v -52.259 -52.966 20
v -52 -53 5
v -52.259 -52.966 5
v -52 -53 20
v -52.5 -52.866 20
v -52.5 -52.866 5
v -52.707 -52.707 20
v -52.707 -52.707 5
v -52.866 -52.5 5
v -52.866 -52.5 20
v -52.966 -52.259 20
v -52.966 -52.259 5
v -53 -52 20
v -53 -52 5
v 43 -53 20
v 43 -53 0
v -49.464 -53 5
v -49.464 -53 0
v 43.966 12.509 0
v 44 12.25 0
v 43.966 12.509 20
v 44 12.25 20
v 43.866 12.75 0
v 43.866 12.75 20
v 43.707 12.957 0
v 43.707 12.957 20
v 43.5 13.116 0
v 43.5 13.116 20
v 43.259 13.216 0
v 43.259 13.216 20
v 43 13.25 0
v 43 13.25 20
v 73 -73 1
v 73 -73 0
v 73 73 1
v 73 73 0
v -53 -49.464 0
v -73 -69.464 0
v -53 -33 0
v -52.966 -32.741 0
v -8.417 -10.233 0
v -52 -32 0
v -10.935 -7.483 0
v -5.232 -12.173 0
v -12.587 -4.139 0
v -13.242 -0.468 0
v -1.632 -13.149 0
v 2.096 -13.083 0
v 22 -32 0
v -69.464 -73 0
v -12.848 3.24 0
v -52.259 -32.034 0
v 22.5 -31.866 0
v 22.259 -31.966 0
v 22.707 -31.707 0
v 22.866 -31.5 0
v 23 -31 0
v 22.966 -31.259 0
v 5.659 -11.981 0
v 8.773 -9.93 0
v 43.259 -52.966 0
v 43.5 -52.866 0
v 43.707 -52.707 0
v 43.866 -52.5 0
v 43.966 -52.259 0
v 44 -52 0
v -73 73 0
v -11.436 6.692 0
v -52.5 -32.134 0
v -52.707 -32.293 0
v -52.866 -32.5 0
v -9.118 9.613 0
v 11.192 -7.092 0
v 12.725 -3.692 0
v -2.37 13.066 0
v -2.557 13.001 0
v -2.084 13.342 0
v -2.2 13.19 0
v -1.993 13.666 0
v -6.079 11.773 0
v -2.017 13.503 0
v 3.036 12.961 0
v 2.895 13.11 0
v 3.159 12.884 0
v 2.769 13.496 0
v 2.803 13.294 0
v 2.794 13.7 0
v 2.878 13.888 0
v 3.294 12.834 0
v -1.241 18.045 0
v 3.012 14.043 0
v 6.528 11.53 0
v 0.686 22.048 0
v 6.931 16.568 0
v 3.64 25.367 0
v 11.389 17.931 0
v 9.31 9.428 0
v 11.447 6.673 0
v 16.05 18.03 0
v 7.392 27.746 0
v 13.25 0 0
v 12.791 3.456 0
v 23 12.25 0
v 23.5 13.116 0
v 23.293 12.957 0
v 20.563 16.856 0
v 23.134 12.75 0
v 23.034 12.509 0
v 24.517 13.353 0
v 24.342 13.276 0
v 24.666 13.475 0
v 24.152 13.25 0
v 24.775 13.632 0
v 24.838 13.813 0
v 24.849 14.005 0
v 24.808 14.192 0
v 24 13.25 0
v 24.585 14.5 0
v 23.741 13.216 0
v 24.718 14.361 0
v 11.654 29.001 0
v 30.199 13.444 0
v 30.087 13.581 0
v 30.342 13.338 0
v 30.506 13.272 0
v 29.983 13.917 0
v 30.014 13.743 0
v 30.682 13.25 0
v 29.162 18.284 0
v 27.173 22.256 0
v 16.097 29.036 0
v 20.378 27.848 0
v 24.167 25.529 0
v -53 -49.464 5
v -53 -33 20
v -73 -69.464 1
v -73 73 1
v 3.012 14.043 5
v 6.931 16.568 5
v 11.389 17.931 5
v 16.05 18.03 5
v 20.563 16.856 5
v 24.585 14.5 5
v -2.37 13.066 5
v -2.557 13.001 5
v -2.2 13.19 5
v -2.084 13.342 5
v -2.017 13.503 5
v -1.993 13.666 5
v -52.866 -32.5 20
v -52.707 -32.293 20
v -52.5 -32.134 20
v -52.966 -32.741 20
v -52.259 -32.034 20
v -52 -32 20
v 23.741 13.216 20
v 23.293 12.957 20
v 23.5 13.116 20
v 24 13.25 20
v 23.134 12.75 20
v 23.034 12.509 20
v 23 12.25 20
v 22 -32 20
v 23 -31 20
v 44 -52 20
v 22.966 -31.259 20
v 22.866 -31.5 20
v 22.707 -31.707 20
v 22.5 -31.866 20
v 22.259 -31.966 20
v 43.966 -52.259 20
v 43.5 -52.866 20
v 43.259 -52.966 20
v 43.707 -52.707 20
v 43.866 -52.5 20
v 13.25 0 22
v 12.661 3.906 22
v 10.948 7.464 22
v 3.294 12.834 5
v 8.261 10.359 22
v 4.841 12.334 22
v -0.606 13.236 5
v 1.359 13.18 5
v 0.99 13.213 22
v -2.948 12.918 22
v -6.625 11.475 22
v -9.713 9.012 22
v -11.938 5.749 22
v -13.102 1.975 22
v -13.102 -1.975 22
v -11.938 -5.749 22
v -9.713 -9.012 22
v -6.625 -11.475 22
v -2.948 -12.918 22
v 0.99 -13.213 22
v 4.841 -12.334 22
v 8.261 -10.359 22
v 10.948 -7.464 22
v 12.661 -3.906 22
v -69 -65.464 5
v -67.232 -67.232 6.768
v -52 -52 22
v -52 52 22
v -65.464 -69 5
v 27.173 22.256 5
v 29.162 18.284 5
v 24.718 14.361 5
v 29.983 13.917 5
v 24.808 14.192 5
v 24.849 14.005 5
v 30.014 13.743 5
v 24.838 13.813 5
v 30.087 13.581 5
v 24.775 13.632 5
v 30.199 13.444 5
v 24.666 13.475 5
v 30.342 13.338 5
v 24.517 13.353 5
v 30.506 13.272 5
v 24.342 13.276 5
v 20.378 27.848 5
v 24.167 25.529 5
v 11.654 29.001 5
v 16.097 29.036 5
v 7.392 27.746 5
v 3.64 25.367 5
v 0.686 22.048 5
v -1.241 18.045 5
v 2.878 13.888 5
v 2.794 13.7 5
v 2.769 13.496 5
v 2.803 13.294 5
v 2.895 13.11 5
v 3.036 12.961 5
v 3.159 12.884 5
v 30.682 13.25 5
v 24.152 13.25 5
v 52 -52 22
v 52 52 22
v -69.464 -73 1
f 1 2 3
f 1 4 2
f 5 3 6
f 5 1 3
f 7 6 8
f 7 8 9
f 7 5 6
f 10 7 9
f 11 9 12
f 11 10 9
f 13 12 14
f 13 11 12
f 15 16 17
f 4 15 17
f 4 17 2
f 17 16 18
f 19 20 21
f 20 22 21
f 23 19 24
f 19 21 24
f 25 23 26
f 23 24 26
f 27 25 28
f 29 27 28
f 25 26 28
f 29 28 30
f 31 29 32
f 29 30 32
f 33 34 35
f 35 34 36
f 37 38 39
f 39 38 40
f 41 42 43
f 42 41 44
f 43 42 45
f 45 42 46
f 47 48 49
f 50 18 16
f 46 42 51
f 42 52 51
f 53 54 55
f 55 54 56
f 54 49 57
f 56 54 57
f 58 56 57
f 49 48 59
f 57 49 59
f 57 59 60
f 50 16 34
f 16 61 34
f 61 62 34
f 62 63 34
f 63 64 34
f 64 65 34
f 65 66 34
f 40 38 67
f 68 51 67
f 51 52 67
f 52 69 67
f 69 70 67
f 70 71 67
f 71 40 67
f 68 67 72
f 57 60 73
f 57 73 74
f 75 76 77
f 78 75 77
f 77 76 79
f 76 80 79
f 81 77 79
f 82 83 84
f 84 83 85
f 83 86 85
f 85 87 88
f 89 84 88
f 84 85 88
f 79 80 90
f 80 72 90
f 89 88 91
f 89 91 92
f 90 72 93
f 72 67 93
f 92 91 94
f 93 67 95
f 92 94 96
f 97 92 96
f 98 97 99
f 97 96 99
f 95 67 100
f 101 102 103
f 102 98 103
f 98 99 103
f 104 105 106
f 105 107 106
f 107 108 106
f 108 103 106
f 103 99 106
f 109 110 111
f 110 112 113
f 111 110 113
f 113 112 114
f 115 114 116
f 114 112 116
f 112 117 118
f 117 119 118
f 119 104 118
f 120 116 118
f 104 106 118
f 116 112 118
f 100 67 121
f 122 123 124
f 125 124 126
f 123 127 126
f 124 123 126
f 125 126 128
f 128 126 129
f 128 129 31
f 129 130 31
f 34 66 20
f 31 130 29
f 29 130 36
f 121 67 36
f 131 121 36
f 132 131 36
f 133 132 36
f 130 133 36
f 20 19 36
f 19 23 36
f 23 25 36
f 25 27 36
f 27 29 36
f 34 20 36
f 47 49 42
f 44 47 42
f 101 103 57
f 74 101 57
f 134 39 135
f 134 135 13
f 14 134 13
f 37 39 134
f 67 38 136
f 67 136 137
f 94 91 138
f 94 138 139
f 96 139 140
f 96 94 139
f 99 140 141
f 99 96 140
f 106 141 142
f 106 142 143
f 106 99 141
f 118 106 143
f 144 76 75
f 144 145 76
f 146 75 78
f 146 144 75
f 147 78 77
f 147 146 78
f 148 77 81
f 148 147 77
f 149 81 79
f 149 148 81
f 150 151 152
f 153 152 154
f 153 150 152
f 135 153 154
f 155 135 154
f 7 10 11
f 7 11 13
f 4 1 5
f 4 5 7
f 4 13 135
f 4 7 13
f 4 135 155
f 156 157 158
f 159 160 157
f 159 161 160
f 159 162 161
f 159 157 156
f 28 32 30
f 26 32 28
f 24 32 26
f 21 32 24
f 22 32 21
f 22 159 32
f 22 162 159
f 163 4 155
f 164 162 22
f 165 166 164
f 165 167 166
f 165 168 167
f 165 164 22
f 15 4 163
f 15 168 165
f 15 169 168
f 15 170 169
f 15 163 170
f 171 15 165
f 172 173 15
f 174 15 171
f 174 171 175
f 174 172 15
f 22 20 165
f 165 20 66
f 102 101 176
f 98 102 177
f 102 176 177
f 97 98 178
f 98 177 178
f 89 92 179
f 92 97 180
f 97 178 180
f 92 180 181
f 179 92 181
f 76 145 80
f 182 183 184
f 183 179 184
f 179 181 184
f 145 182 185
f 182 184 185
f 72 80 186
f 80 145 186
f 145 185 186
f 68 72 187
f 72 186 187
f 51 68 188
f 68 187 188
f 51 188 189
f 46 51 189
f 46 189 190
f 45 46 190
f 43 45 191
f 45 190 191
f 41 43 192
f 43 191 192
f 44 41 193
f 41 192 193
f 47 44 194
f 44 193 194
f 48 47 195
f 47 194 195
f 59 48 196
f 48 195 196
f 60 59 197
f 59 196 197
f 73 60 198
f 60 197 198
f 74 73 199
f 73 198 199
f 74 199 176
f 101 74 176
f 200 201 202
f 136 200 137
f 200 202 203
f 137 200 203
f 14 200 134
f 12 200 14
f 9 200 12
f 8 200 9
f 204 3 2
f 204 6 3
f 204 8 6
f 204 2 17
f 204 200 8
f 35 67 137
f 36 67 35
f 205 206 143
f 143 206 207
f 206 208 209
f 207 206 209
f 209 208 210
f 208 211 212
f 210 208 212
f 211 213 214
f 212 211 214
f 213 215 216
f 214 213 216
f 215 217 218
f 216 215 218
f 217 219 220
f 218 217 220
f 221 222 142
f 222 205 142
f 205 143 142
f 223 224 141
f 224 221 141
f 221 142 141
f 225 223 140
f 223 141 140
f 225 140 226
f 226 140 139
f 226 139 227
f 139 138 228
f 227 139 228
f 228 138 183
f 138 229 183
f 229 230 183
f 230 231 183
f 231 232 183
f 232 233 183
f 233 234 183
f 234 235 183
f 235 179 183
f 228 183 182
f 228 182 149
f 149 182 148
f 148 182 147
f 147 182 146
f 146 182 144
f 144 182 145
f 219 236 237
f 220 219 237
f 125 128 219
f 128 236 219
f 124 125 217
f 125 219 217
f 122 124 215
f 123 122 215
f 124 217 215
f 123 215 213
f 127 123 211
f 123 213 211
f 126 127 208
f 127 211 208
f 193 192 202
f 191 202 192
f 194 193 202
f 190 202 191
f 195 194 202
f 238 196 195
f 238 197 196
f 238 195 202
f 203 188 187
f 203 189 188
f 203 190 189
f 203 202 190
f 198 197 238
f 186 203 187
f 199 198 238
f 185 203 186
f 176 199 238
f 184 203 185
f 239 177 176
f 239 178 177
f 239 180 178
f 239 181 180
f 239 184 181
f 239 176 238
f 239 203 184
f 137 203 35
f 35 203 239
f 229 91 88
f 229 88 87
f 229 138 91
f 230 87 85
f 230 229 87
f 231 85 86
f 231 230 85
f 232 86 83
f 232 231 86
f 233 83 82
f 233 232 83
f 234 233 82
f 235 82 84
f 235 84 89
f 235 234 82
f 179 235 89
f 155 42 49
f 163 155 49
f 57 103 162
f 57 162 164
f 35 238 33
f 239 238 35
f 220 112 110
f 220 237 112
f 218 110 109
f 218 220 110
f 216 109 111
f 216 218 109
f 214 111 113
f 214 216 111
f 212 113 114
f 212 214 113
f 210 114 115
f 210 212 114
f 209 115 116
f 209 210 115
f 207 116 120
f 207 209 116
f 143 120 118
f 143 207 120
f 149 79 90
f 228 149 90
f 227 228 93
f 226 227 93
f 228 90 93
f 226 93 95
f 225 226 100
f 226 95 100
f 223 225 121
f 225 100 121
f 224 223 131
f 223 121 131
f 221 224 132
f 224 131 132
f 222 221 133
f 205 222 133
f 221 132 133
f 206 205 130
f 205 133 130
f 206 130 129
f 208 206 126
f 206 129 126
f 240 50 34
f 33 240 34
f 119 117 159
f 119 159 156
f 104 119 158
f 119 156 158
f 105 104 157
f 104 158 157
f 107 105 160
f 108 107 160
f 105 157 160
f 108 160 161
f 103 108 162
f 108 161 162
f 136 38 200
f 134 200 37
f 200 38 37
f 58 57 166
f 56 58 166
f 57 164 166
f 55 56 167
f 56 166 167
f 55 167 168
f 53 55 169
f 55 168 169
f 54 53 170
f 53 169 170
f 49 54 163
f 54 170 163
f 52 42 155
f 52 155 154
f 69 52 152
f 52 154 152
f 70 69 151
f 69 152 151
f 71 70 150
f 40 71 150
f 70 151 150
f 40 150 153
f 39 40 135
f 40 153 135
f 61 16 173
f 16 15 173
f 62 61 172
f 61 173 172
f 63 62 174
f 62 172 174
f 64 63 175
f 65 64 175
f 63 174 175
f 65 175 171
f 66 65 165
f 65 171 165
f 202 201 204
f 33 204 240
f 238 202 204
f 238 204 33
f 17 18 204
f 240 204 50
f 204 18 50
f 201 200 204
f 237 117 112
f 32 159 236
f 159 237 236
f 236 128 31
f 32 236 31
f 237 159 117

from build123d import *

# Parameters (mm, degrees)
SKETCH_W        = 146
SKETCH_H        = 146
PAD_DEPTH       = 22
CHAMFER_SIZE    = 21
SKETCH001_R     = 13.25
POCKET_DEPTH    = 22.001
SKETCH002_W     = 21
SKETCH002_H     = 66.25
SKETCH002_W_2   = 76
SKETCH002_H_2   = 21
POCKET001_DEPTH = 20
POCKET002_DEPTH = 5
POCKET003_DEPTH = 22.001
FILLET_R        = 1
FILLET001_R     = 0.7


with BuildPart() as part:
    # Sketch → Pad (new body)
    with BuildSketch(Plane.XY):
        Rectangle(SKETCH_W, SKETCH_H)
    extrude(amount=PAD_DEPTH)

    # Chamfer
    chamfer_edges = [part.edges().sort_by_distance(p)[0] for p in [
        (73, 0, 22),
        (0, -73, 22),
        (-73, 0, 22),
        (0, 73, 22),
    ]]
    chamfer(chamfer_edges, length=CHAMFER_SIZE)

    # Sketch001 (on Face6 of Pad) → Pocket (cut, through all)
    with BuildSketch(Plane.XY.offset(22)):
        Circle(SKETCH001_R)
    extrude(amount=-POCKET_DEPTH, mode=Mode.SUBTRACT)

    # Sketch002 (on Face4 of Pocket) → Pocket001 (cut)
    with BuildSketch(Plane(origin=(0, 0, 0), x_dir=(1, 0, 0), z_dir=(0, 0, -1))):
        with Locations((33.5, 19.875)):
            Rectangle(SKETCH002_W, SKETCH002_H)
        with Locations((-15, 42.5)):
            Rectangle(SKETCH002_W_2, SKETCH002_H_2)
    extrude(amount=-POCKET001_DEPTH, mode=Mode.SUBTRACT)

    # Sketch003 (on Face4 of Pocket001) → Pocket002 (cut)
    with BuildSketch(Plane(origin=(0, 0, 0), x_dir=(1, 0, 0), z_dir=(0, 0, -1))):
        with BuildLine():
            Line((26, -13.25), (30, -13.25))
            ThreePointArc((-2, -13.098187), (13.924093, -29.174093), (30, -13.25))
            Line((2, -13.098187), (-2, -13.098187))
            ThreePointArc((2, -13.098187), (13.968558, -18.144656), (26, -13.25))
        make_face()
        Polygon((-49.464466, 53), (-71.232233, 74.767767), (-74.767767, 71.232233), (-53, 49.464466), align=None)
    extrude(amount=-POCKET002_DEPTH, mode=Mode.SUBTRACT)

    # Sketch004 (on Face3 of Pocket002) → Pocket003 (cut, through all)
    with BuildSketch(Plane(origin=(0, 0, 0), x_dir=(1, 0, 0), z_dir=(0, 0, -1))):
        Polygon((-69, 65.464466), (-65.464466, 69), (-69.464466, 73), (-73, 69.464466), align=None)
    extrude(amount=-POCKET003_DEPTH, mode=Mode.SUBTRACT)

    # Fillet
    fillet_edges = [part.edges().sort_by_distance(p)[0] for p in [
        (-53, -32, 10),
        (23, -32, 10),
        (23, 13.25, 10),
        (44, -53, 10),
        (44, 13.25, 10),
        (-53, -53, 12.5),
    ]]
    fillet(fillet_edges, radius=FILLET_R)

    # Fillet001
    fillet001_edges = [part.edges().sort_by_distance(p)[0] for p in [
        (2, 13.098187, 2.5),
        (30, 13.25, 2.5),
        (26, 13.25, 2.5),
        (-2, 13.098187, 2.5),
    ]]
    fillet(fillet001_edges, radius=FILLET001_R)


solid = part.part
